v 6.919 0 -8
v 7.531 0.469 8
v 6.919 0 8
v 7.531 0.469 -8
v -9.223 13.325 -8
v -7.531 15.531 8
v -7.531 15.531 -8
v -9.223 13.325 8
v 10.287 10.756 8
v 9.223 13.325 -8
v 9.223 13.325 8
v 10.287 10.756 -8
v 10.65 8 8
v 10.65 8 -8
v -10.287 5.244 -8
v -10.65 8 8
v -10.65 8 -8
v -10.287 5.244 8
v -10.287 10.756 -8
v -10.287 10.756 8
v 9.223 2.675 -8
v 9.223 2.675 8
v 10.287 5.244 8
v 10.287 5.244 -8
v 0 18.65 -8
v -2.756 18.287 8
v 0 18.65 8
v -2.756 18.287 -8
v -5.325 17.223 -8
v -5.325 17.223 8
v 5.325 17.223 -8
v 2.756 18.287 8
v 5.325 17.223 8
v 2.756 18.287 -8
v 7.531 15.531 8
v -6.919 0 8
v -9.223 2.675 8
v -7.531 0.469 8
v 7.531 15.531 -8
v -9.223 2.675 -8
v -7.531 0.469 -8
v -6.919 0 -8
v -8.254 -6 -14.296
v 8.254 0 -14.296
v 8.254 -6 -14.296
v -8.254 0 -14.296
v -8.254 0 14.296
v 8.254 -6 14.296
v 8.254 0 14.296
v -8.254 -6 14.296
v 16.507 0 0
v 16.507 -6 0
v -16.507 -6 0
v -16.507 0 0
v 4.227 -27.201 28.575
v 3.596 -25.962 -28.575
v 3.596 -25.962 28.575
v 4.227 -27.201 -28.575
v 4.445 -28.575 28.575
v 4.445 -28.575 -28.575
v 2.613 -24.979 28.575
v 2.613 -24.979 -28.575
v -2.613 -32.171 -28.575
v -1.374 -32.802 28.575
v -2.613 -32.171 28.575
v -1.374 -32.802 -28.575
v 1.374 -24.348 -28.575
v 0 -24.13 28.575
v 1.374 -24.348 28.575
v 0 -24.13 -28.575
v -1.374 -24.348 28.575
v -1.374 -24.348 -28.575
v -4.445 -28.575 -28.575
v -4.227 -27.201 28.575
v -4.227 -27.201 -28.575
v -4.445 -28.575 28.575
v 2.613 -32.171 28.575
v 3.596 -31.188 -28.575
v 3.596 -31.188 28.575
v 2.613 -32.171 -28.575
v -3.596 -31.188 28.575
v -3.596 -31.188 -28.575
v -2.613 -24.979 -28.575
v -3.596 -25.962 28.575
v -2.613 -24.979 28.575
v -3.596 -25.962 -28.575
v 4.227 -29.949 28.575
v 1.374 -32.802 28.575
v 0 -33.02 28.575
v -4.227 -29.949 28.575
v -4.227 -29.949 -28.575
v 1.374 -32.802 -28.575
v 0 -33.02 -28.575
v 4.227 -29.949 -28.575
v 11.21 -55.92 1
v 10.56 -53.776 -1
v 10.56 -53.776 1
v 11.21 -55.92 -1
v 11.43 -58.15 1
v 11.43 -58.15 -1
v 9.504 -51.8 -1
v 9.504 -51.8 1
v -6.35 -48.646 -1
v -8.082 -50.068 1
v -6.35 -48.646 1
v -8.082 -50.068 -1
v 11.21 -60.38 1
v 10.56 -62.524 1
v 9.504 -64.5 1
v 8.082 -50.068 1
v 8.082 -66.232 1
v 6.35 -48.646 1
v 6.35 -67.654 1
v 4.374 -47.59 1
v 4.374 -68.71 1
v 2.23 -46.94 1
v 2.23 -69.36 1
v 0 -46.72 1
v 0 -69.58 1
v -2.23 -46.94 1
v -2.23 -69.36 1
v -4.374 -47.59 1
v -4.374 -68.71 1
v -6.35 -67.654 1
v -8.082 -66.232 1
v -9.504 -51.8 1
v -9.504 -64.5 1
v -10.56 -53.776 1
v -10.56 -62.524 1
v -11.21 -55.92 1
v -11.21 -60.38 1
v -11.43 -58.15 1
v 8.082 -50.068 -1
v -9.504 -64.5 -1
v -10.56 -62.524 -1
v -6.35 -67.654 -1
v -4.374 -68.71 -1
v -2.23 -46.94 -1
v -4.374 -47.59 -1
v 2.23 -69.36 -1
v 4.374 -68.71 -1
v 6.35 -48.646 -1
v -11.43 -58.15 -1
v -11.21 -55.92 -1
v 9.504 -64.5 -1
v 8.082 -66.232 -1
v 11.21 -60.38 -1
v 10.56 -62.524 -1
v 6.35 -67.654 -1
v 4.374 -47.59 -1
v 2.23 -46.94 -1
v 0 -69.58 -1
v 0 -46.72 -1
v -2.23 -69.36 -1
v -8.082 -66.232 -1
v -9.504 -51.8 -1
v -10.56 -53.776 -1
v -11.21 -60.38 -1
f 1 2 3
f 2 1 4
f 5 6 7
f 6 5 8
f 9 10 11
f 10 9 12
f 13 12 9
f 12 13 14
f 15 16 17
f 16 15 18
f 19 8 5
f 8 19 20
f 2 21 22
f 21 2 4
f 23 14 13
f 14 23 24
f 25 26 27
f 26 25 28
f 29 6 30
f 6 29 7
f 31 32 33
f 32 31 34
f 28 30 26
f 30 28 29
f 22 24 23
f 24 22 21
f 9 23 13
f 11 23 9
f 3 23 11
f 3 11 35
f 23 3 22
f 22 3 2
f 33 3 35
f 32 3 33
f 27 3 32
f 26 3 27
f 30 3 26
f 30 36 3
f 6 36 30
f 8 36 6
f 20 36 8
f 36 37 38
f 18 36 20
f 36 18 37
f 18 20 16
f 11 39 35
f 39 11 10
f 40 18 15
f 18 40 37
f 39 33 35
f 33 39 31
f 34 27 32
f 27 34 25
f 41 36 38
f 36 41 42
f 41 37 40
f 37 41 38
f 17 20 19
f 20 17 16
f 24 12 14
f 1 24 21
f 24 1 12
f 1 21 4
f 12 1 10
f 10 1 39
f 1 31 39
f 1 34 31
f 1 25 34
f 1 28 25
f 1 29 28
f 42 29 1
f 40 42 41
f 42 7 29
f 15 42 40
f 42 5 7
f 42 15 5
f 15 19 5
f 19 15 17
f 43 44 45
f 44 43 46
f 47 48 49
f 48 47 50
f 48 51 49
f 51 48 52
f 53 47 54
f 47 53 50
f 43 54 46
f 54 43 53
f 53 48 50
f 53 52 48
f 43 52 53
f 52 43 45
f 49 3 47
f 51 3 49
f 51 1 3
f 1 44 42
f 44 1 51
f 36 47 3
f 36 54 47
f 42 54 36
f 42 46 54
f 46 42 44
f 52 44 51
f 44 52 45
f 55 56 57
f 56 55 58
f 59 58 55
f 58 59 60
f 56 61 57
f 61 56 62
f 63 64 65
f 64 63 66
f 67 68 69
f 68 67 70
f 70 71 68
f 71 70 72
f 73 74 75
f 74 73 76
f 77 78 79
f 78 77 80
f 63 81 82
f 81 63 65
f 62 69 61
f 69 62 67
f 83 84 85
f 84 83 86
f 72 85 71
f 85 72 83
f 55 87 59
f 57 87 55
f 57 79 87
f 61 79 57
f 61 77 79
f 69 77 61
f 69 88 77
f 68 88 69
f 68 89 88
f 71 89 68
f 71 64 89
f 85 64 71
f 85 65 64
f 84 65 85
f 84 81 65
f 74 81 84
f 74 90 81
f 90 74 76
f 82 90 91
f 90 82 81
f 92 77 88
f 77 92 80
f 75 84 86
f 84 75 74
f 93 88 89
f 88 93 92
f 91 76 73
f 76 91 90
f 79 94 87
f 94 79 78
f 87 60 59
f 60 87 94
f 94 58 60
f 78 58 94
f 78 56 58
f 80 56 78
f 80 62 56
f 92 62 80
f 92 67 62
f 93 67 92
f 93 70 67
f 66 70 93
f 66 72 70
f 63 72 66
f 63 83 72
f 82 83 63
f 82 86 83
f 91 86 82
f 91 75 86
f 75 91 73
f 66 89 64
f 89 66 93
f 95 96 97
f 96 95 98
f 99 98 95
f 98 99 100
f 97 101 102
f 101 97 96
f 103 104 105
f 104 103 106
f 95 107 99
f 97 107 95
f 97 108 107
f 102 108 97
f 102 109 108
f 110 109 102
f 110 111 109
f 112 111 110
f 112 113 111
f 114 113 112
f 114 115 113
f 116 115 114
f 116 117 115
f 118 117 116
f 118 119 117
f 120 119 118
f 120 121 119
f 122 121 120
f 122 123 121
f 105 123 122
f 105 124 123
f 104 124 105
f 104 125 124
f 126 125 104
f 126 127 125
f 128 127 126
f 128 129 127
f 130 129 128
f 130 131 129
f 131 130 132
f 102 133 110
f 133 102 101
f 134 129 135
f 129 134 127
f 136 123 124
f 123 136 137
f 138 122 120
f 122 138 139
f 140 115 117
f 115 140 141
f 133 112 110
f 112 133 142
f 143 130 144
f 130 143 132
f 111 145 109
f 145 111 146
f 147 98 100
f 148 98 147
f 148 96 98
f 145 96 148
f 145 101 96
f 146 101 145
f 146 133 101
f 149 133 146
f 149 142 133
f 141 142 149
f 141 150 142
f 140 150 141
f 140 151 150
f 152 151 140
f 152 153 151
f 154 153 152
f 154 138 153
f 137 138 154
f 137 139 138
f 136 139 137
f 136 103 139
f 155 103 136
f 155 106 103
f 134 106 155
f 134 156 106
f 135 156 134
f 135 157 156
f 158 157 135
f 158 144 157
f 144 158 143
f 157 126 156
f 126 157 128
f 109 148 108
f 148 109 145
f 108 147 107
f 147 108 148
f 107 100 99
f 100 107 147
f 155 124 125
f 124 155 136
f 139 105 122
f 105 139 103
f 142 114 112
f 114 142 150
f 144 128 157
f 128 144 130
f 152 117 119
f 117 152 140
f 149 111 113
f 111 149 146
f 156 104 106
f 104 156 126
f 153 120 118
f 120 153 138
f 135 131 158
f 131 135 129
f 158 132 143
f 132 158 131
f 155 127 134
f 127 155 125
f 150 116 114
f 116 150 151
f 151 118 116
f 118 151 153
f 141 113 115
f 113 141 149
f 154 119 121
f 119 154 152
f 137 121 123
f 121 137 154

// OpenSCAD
// Auto-generated by scripts/author_from_manifest.py (Phase D.3).
// Source: data/phase_d_manifest.json (sku_intent='globe-gl5616-pendent-155f').
// Do not hand-edit — regenerate from the manifest.
//
// @part globe_gl5616_pendent_155f
// @kind sprinkler_head
// @category head.pendant.k56
// @display-name "Globe GL5616 Pendent K5.6 SR 155°F"
// @mfg globe_fire_sprinkler
// @mfg-pn GL5616
// @listing UL FM
// @hazard-classes LH OH1
// @price-usd 11.95
// @install-minutes 8
// @crew journeyman
// @k-factor 5.6
// @orientation pendant
// @response standard
// @temperature 155F
// @param size_in number default=0.5 label="Size" unit="in"
// @port inlet position=[0,0.014,0] direction=[0,1,0] style=NPT_threaded size_in=0.5 role=drop

size_in = 0.5;
k_factor = 5.6;

length_mm   = 57.15;
body_dia_mm = 25.40;
thread_od   = 21.3;
thread_len  = 16;
deflector_d = body_dia_mm * 0.9;

 union() {
    translate([0, thread_len/2, 0])
        cylinder(h = thread_len, d = thread_od, center = true, $fn = 24);
    translate([0, -3, 0])
        rotate([90, 0, 0])
        cylinder(h = 6, d = thread_od * 1.55, $fn = 6, center = true);
    translate([0, -length_mm/2, 0])
        cylinder(h = length_mm, d = body_dia_mm * 0.35, center = true, $fn = 20);
    translate([0, -length_mm - 1, 0])
        cylinder(h = 2, d = deflector_d, center = true, $fn = 32);
}
